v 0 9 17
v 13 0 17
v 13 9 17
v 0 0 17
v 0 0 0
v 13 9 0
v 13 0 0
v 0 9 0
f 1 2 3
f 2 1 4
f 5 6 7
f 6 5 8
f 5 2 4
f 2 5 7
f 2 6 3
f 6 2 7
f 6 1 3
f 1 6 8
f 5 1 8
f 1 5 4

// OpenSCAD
// Generated by SolidPython 1.0.1 on 2020-07-29 00:46:55


cube(size = [13, 9, 17]);
/***********************************************
*********      SolidPython code:      **********
************************************************
 
# import packages: SolidPython
from solid import *
from solid.utils import *
from itertools import chain, combinations, permutations


class Resize:

    def __init__(self, scad_file):
        self.scad_file = scad_file
        #self.scad_file = import_scad(scad_file)
        # cone/cylinder param:
        self.r1 = 0
        self.r2 = 0
        self.h = 0
        # rectangular prism param:
        self.w = 0
        self.l = 0
        # ellipse param:
        self.r = 0

    # import OpenScad code (file name corresponds to shape)


    # classify shape + parameters
    def assign(self, param1, param2, param3):
        if self.scad_file == 'cone.scad':
            self.r1 = param1
            self.r2 = param2
            self.h = param3
        elif self.scad_file == 'cylinder.scad':
            self.r1 = param1
            self.r2 = param2
            self.h = param3
        elif self.scad_file == 'rectangularPrism.scad':
            self.h = param1
            self.l = param2
            self.w = param3
        else:
            self.r = param1
            self.h = param2

    # resize parameters
    def iterate(self):
        x = range(3, 20, 2)
        i = 1
        if self.scad_file == 'cone.scad':
            tempList = list(permutations(x, 2))
            for temp in tempList:
                param1 = temp[0]
                param2 = temp[1]
                filepath = 'produced_scad_files/' + 'cone' + str(param1) + '_' + str(param2) + '_' + '.scad'
                scad_render_to_file(cylinder(h=param1, r1=param2, r2=0), filepath)

        elif self.scad_file == 'cylinder.scad':
            tempList = list(permutations(x, 3))
            for temp in tempList:
                param1 = temp[0]
                param2 = temp[1]
                filepath = 'produced_scad_files/' + 'cylinder' + str(param1) + '_' + str(param2) + '_' + '.scad'
                scad_render_to_file(cylinder(h=param1, r1=param2, r2=param2), filepath)

        elif self.scad_file == 'rectangularPrism.scad':
            tempList = list(permutations(x, 3))
            for temp in tempList:
                param1 = temp[0]
                param2 = temp[1]
                param3 = temp[2]
                filepath = 'produced_scad_files/' + 'rectangularPrism' + str(param1) + '_' + str(param2) + '_' + str(
                    param3) + '.scad'
                scad_render_to_file(cube(size=(param1, param2, param3)), filepath)

        elif self.scad_file == 'ellipse.scad':
            tempList = list(permutations(x, 4))
            for temp in tempList:
                param1 = temp[0]
                param2 = temp[1]
                param3 = temp[2]
                param4 = temp[3]
                filepath = 'produced_scad_files/' + 'ellipse' + str(param1) + '_' + str(param2) + '_' + str(param3) + '_' + str(param4) + '.scad'
                scad_render_to_file(scale([param1, param2, param3])(sphere(r=param4)), filepath)

    def render_to_scadfile(self):
        scad_render_to_file(scad, 'example.scad') 
 
************************************************/
